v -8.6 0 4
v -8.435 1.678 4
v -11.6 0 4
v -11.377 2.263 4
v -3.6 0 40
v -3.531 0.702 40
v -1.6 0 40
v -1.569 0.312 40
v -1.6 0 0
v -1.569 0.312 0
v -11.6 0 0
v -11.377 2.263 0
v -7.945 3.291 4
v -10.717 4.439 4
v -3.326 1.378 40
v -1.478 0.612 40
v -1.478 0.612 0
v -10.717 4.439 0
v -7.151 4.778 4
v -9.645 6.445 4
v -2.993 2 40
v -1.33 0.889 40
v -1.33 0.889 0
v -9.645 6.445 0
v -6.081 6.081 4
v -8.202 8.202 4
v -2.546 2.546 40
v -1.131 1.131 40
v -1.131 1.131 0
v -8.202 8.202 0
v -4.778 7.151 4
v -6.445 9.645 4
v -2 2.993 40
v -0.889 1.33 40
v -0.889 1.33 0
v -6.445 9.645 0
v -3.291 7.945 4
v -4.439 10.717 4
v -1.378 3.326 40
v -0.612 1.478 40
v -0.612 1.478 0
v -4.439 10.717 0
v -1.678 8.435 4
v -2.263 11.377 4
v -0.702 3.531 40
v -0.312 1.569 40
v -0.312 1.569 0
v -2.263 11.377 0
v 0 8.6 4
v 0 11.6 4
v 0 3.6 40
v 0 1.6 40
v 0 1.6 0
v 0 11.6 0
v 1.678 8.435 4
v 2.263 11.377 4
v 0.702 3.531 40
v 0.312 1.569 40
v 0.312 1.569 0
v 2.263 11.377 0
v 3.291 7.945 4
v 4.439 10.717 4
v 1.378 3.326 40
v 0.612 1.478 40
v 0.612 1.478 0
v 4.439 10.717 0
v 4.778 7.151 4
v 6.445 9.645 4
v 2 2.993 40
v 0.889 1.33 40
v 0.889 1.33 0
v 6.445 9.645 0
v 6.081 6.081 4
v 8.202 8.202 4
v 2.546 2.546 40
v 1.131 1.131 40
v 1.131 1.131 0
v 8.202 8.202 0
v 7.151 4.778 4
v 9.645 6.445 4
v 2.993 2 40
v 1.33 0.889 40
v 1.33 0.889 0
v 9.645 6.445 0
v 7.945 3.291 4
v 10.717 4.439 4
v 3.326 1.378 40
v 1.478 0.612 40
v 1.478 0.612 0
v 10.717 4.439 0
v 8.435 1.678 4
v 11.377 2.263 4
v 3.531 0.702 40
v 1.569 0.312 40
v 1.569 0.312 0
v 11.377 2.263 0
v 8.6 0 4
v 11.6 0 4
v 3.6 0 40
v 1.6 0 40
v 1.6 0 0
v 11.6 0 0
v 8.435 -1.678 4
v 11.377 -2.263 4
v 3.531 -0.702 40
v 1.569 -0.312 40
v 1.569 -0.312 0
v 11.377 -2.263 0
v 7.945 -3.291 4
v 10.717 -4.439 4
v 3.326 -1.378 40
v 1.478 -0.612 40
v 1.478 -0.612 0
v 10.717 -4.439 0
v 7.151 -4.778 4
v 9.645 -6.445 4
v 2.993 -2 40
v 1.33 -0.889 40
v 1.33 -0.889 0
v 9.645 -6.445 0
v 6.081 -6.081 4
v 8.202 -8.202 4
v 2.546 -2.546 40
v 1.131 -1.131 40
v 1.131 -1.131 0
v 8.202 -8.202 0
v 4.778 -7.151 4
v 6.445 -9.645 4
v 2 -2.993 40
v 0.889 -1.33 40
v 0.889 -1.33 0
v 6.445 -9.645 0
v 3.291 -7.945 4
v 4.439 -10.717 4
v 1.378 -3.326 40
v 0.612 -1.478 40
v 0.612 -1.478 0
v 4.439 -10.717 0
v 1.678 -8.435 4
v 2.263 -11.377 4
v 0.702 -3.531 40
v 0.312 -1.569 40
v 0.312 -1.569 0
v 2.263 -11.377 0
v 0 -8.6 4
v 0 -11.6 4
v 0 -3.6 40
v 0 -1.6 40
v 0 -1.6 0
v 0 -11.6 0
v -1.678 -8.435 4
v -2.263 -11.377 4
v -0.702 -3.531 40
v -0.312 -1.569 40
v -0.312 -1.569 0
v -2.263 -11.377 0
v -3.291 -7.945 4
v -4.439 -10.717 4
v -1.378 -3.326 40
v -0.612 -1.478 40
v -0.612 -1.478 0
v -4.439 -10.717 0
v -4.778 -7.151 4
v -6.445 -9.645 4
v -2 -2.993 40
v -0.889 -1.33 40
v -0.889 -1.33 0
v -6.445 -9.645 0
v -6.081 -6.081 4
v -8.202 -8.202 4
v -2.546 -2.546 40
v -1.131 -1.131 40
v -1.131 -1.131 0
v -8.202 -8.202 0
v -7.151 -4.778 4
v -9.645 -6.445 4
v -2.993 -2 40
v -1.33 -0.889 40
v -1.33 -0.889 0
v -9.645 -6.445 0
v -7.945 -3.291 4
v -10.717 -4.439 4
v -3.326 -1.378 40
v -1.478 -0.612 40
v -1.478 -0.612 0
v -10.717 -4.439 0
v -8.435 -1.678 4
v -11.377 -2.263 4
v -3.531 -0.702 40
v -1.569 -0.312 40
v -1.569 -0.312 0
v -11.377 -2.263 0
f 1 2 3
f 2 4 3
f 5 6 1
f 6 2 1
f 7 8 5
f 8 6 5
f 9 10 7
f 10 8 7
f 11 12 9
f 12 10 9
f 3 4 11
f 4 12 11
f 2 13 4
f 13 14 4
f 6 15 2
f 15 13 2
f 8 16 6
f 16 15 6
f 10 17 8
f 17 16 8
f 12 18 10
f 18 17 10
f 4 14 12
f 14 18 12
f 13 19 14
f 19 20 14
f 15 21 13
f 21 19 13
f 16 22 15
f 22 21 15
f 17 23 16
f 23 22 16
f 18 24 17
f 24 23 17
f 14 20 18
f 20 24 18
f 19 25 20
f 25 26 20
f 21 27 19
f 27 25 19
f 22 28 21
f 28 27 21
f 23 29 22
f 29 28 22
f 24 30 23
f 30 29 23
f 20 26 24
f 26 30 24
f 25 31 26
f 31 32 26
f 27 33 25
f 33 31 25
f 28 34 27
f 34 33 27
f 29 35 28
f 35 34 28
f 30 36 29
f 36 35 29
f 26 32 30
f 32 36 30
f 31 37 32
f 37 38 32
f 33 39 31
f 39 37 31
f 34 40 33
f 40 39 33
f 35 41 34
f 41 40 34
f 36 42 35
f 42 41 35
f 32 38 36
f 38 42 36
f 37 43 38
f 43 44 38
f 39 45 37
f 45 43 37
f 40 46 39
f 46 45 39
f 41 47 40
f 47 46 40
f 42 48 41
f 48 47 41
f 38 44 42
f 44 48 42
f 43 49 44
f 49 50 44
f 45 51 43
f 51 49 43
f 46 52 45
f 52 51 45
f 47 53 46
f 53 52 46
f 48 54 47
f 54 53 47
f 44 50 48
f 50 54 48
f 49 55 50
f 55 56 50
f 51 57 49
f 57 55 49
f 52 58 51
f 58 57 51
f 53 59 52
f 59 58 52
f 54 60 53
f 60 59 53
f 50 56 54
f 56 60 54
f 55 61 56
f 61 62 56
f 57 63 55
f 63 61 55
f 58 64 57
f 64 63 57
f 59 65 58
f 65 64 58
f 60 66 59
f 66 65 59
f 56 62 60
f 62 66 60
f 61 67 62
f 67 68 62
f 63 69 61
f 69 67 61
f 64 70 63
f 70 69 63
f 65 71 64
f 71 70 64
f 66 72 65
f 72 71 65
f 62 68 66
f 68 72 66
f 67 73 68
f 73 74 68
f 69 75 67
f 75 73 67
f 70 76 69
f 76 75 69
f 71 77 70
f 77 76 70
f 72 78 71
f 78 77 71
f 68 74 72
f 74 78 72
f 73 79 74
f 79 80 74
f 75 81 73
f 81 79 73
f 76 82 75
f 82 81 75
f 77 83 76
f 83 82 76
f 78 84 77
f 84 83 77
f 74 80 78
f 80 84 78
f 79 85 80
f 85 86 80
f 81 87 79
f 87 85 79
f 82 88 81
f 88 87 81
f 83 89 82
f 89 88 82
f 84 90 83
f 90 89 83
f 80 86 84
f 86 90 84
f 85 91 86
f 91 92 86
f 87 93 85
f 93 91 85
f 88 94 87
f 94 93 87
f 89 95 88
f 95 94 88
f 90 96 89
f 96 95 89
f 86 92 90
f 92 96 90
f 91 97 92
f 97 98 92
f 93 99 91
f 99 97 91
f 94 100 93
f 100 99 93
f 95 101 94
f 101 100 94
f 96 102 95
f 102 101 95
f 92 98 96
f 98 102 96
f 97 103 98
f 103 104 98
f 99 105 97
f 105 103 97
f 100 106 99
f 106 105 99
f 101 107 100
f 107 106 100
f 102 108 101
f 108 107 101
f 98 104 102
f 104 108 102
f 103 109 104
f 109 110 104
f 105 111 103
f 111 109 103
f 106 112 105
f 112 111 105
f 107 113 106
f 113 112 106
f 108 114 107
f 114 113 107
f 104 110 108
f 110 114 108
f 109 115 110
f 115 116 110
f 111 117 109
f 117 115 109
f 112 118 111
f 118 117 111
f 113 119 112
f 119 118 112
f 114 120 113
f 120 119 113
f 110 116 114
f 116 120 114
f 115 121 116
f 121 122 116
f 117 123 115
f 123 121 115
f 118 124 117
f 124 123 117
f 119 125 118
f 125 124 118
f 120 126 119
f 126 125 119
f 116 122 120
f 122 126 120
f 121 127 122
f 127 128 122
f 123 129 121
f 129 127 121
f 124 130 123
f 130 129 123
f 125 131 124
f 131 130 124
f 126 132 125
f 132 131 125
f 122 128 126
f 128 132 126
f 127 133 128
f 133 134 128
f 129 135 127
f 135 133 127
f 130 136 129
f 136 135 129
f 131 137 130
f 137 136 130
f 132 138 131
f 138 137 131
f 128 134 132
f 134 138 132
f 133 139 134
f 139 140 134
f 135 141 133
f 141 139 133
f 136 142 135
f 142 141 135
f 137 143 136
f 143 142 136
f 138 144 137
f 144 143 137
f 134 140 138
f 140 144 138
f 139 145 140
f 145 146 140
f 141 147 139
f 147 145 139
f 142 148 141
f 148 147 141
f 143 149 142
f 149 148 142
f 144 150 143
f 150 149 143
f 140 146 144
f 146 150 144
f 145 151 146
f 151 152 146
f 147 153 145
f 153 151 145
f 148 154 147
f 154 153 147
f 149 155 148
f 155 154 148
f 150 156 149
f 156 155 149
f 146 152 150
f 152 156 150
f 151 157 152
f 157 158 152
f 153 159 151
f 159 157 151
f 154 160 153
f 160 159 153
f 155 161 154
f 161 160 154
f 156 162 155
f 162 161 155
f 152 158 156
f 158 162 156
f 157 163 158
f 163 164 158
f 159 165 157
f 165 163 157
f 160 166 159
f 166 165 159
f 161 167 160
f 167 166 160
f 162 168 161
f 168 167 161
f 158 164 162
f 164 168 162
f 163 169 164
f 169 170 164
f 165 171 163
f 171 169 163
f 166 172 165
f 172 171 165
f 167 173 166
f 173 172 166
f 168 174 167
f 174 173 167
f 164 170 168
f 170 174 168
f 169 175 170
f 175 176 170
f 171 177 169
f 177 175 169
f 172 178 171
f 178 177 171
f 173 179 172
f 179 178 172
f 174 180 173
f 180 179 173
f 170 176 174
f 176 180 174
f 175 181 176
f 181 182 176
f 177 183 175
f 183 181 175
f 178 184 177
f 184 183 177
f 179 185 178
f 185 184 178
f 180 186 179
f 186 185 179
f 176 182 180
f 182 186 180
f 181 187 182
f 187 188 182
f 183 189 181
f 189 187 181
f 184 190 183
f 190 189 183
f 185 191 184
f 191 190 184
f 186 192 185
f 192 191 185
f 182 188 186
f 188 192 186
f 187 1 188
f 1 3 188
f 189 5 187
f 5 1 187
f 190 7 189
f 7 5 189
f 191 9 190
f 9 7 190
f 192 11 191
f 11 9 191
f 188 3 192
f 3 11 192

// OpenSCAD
$fn = 32;

// ----------------------------------------------------------------------
// Profiled standoff: conical spacer, 40 mm long, bore 3.2 mm
// ----------------------------------------------------------------------

// --- parameters (mm) ---
revolve_angle = 360;      // full turn around the Z axis
profile_points = 6;       // points of the closed outline

profile = [[1.6, 0], [11.6, 0], [11.6, 4], [8.6, 4], [3.6, 40], [1.6, 40]];  // single closed polygon, 6 points, counter clockwise

// --- the one profile operation ---
rotate_extrude(angle = revolve_angle) polygon(points = profile);
